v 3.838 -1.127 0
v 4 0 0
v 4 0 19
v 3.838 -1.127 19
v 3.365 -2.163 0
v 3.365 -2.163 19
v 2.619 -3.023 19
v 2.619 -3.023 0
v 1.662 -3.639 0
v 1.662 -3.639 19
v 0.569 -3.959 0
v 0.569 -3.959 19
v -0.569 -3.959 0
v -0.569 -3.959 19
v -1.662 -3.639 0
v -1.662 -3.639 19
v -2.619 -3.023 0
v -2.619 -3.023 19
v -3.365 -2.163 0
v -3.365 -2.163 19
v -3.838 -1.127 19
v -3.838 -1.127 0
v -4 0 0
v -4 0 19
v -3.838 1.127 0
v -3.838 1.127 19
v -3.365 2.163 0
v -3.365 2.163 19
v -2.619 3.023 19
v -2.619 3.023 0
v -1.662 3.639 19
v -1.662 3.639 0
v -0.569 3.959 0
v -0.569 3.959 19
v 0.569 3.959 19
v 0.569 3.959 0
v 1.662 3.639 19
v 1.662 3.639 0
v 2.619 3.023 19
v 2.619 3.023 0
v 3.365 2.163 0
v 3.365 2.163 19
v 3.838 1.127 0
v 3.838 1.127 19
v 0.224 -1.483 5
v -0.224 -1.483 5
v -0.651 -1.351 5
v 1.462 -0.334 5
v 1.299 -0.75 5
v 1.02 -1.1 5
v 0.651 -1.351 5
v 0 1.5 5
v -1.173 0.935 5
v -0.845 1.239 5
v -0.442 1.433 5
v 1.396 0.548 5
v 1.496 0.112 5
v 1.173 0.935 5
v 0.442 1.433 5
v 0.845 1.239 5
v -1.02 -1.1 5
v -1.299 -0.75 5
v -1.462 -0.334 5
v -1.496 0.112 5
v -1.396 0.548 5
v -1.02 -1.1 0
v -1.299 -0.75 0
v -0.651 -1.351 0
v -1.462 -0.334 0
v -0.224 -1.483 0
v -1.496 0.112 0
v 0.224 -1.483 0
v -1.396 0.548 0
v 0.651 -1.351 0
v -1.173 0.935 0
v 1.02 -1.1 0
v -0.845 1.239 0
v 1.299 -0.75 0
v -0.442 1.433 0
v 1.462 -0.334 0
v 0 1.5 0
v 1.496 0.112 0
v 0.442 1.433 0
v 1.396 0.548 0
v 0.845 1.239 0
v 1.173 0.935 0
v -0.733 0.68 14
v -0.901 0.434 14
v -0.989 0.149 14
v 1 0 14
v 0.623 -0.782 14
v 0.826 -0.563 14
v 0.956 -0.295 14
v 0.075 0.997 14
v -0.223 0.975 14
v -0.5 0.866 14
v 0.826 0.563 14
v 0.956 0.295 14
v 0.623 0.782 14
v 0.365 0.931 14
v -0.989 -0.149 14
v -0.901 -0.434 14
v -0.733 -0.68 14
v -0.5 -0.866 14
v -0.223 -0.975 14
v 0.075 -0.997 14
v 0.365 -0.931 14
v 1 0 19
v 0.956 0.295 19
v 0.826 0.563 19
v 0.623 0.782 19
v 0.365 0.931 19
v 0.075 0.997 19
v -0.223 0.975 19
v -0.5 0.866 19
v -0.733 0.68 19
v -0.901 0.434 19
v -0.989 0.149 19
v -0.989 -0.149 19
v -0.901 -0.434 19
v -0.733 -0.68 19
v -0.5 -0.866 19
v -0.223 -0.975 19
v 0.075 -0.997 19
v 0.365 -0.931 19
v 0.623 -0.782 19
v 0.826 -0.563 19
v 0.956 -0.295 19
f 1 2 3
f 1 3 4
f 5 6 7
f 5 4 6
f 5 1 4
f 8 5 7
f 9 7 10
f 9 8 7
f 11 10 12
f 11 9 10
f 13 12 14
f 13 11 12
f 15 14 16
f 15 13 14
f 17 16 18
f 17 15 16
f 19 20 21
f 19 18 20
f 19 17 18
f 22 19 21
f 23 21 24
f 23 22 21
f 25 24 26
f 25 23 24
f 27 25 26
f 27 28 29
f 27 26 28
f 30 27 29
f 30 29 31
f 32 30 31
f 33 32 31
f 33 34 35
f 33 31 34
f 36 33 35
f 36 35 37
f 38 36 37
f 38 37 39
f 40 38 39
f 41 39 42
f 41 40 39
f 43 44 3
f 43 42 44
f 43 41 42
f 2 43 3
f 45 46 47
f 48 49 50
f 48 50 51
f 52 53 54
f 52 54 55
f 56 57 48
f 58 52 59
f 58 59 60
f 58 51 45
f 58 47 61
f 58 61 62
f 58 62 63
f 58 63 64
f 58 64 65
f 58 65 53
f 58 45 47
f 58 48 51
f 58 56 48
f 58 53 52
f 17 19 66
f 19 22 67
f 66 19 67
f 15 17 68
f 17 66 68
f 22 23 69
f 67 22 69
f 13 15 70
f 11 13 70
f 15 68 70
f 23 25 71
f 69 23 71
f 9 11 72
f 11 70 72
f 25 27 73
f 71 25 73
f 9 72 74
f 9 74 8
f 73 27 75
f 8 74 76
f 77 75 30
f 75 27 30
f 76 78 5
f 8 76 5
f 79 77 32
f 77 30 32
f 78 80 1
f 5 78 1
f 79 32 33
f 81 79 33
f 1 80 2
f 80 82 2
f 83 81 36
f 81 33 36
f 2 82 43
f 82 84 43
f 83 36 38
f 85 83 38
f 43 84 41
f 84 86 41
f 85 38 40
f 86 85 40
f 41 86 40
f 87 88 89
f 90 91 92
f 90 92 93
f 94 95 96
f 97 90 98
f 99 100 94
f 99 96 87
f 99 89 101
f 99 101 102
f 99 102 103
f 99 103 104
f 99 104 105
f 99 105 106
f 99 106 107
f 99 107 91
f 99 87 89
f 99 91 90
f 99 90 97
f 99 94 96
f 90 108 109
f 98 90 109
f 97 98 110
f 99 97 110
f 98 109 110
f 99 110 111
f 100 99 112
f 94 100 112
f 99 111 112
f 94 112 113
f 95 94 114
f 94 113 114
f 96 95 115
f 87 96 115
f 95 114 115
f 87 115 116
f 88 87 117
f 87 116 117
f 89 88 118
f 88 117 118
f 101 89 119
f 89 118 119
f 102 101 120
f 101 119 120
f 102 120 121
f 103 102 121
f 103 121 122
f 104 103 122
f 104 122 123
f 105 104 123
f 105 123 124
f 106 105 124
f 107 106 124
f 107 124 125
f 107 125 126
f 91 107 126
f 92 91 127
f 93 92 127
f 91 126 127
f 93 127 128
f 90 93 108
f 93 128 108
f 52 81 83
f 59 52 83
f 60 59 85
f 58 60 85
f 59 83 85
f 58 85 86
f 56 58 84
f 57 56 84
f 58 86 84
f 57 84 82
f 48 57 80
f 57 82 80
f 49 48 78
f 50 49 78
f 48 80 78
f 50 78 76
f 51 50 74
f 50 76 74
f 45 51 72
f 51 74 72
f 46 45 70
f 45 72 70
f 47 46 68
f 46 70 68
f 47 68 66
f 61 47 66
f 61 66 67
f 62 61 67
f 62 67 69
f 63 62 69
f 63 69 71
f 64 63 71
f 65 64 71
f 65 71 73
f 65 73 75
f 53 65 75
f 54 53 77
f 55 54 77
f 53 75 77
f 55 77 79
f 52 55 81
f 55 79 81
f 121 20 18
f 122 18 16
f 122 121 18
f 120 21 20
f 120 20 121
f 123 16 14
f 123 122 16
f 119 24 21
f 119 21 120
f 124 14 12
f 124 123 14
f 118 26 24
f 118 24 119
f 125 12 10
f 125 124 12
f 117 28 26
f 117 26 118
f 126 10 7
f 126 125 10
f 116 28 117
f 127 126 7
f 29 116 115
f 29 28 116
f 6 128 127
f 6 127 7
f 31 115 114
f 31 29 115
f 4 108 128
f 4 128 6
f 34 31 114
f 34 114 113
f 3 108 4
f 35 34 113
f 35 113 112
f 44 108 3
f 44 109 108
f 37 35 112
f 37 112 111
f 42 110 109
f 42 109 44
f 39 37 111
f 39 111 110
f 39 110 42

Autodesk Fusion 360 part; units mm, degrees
sketch "スケッチ1" plane through (0, 0, 0) normal (0, 0, 1) x (1, 0, 0)
  circle A0 centre (0, 0) radius 4
  dimension "d1" = 8
extrude "押し出し1" add sketch "スケッチ1" along normal blind 19
cylinder "円柱プリミティブ1" cut diameter 2 height -5 placed x (1, 0, 0) y (0, 1, 0) z (0, 0, 1) at (0, 0, 19)
thread "ねじ1" thread offset 0 thread length 10
cylinder "円柱プリミティブ2" cut diameter 3 height -5 placed x (0, 1, 0) y (1, 0, 0) z (0, 0, -1) at (0, 0, 0)
thread "ねじ2" thread offset 0 thread length 10
